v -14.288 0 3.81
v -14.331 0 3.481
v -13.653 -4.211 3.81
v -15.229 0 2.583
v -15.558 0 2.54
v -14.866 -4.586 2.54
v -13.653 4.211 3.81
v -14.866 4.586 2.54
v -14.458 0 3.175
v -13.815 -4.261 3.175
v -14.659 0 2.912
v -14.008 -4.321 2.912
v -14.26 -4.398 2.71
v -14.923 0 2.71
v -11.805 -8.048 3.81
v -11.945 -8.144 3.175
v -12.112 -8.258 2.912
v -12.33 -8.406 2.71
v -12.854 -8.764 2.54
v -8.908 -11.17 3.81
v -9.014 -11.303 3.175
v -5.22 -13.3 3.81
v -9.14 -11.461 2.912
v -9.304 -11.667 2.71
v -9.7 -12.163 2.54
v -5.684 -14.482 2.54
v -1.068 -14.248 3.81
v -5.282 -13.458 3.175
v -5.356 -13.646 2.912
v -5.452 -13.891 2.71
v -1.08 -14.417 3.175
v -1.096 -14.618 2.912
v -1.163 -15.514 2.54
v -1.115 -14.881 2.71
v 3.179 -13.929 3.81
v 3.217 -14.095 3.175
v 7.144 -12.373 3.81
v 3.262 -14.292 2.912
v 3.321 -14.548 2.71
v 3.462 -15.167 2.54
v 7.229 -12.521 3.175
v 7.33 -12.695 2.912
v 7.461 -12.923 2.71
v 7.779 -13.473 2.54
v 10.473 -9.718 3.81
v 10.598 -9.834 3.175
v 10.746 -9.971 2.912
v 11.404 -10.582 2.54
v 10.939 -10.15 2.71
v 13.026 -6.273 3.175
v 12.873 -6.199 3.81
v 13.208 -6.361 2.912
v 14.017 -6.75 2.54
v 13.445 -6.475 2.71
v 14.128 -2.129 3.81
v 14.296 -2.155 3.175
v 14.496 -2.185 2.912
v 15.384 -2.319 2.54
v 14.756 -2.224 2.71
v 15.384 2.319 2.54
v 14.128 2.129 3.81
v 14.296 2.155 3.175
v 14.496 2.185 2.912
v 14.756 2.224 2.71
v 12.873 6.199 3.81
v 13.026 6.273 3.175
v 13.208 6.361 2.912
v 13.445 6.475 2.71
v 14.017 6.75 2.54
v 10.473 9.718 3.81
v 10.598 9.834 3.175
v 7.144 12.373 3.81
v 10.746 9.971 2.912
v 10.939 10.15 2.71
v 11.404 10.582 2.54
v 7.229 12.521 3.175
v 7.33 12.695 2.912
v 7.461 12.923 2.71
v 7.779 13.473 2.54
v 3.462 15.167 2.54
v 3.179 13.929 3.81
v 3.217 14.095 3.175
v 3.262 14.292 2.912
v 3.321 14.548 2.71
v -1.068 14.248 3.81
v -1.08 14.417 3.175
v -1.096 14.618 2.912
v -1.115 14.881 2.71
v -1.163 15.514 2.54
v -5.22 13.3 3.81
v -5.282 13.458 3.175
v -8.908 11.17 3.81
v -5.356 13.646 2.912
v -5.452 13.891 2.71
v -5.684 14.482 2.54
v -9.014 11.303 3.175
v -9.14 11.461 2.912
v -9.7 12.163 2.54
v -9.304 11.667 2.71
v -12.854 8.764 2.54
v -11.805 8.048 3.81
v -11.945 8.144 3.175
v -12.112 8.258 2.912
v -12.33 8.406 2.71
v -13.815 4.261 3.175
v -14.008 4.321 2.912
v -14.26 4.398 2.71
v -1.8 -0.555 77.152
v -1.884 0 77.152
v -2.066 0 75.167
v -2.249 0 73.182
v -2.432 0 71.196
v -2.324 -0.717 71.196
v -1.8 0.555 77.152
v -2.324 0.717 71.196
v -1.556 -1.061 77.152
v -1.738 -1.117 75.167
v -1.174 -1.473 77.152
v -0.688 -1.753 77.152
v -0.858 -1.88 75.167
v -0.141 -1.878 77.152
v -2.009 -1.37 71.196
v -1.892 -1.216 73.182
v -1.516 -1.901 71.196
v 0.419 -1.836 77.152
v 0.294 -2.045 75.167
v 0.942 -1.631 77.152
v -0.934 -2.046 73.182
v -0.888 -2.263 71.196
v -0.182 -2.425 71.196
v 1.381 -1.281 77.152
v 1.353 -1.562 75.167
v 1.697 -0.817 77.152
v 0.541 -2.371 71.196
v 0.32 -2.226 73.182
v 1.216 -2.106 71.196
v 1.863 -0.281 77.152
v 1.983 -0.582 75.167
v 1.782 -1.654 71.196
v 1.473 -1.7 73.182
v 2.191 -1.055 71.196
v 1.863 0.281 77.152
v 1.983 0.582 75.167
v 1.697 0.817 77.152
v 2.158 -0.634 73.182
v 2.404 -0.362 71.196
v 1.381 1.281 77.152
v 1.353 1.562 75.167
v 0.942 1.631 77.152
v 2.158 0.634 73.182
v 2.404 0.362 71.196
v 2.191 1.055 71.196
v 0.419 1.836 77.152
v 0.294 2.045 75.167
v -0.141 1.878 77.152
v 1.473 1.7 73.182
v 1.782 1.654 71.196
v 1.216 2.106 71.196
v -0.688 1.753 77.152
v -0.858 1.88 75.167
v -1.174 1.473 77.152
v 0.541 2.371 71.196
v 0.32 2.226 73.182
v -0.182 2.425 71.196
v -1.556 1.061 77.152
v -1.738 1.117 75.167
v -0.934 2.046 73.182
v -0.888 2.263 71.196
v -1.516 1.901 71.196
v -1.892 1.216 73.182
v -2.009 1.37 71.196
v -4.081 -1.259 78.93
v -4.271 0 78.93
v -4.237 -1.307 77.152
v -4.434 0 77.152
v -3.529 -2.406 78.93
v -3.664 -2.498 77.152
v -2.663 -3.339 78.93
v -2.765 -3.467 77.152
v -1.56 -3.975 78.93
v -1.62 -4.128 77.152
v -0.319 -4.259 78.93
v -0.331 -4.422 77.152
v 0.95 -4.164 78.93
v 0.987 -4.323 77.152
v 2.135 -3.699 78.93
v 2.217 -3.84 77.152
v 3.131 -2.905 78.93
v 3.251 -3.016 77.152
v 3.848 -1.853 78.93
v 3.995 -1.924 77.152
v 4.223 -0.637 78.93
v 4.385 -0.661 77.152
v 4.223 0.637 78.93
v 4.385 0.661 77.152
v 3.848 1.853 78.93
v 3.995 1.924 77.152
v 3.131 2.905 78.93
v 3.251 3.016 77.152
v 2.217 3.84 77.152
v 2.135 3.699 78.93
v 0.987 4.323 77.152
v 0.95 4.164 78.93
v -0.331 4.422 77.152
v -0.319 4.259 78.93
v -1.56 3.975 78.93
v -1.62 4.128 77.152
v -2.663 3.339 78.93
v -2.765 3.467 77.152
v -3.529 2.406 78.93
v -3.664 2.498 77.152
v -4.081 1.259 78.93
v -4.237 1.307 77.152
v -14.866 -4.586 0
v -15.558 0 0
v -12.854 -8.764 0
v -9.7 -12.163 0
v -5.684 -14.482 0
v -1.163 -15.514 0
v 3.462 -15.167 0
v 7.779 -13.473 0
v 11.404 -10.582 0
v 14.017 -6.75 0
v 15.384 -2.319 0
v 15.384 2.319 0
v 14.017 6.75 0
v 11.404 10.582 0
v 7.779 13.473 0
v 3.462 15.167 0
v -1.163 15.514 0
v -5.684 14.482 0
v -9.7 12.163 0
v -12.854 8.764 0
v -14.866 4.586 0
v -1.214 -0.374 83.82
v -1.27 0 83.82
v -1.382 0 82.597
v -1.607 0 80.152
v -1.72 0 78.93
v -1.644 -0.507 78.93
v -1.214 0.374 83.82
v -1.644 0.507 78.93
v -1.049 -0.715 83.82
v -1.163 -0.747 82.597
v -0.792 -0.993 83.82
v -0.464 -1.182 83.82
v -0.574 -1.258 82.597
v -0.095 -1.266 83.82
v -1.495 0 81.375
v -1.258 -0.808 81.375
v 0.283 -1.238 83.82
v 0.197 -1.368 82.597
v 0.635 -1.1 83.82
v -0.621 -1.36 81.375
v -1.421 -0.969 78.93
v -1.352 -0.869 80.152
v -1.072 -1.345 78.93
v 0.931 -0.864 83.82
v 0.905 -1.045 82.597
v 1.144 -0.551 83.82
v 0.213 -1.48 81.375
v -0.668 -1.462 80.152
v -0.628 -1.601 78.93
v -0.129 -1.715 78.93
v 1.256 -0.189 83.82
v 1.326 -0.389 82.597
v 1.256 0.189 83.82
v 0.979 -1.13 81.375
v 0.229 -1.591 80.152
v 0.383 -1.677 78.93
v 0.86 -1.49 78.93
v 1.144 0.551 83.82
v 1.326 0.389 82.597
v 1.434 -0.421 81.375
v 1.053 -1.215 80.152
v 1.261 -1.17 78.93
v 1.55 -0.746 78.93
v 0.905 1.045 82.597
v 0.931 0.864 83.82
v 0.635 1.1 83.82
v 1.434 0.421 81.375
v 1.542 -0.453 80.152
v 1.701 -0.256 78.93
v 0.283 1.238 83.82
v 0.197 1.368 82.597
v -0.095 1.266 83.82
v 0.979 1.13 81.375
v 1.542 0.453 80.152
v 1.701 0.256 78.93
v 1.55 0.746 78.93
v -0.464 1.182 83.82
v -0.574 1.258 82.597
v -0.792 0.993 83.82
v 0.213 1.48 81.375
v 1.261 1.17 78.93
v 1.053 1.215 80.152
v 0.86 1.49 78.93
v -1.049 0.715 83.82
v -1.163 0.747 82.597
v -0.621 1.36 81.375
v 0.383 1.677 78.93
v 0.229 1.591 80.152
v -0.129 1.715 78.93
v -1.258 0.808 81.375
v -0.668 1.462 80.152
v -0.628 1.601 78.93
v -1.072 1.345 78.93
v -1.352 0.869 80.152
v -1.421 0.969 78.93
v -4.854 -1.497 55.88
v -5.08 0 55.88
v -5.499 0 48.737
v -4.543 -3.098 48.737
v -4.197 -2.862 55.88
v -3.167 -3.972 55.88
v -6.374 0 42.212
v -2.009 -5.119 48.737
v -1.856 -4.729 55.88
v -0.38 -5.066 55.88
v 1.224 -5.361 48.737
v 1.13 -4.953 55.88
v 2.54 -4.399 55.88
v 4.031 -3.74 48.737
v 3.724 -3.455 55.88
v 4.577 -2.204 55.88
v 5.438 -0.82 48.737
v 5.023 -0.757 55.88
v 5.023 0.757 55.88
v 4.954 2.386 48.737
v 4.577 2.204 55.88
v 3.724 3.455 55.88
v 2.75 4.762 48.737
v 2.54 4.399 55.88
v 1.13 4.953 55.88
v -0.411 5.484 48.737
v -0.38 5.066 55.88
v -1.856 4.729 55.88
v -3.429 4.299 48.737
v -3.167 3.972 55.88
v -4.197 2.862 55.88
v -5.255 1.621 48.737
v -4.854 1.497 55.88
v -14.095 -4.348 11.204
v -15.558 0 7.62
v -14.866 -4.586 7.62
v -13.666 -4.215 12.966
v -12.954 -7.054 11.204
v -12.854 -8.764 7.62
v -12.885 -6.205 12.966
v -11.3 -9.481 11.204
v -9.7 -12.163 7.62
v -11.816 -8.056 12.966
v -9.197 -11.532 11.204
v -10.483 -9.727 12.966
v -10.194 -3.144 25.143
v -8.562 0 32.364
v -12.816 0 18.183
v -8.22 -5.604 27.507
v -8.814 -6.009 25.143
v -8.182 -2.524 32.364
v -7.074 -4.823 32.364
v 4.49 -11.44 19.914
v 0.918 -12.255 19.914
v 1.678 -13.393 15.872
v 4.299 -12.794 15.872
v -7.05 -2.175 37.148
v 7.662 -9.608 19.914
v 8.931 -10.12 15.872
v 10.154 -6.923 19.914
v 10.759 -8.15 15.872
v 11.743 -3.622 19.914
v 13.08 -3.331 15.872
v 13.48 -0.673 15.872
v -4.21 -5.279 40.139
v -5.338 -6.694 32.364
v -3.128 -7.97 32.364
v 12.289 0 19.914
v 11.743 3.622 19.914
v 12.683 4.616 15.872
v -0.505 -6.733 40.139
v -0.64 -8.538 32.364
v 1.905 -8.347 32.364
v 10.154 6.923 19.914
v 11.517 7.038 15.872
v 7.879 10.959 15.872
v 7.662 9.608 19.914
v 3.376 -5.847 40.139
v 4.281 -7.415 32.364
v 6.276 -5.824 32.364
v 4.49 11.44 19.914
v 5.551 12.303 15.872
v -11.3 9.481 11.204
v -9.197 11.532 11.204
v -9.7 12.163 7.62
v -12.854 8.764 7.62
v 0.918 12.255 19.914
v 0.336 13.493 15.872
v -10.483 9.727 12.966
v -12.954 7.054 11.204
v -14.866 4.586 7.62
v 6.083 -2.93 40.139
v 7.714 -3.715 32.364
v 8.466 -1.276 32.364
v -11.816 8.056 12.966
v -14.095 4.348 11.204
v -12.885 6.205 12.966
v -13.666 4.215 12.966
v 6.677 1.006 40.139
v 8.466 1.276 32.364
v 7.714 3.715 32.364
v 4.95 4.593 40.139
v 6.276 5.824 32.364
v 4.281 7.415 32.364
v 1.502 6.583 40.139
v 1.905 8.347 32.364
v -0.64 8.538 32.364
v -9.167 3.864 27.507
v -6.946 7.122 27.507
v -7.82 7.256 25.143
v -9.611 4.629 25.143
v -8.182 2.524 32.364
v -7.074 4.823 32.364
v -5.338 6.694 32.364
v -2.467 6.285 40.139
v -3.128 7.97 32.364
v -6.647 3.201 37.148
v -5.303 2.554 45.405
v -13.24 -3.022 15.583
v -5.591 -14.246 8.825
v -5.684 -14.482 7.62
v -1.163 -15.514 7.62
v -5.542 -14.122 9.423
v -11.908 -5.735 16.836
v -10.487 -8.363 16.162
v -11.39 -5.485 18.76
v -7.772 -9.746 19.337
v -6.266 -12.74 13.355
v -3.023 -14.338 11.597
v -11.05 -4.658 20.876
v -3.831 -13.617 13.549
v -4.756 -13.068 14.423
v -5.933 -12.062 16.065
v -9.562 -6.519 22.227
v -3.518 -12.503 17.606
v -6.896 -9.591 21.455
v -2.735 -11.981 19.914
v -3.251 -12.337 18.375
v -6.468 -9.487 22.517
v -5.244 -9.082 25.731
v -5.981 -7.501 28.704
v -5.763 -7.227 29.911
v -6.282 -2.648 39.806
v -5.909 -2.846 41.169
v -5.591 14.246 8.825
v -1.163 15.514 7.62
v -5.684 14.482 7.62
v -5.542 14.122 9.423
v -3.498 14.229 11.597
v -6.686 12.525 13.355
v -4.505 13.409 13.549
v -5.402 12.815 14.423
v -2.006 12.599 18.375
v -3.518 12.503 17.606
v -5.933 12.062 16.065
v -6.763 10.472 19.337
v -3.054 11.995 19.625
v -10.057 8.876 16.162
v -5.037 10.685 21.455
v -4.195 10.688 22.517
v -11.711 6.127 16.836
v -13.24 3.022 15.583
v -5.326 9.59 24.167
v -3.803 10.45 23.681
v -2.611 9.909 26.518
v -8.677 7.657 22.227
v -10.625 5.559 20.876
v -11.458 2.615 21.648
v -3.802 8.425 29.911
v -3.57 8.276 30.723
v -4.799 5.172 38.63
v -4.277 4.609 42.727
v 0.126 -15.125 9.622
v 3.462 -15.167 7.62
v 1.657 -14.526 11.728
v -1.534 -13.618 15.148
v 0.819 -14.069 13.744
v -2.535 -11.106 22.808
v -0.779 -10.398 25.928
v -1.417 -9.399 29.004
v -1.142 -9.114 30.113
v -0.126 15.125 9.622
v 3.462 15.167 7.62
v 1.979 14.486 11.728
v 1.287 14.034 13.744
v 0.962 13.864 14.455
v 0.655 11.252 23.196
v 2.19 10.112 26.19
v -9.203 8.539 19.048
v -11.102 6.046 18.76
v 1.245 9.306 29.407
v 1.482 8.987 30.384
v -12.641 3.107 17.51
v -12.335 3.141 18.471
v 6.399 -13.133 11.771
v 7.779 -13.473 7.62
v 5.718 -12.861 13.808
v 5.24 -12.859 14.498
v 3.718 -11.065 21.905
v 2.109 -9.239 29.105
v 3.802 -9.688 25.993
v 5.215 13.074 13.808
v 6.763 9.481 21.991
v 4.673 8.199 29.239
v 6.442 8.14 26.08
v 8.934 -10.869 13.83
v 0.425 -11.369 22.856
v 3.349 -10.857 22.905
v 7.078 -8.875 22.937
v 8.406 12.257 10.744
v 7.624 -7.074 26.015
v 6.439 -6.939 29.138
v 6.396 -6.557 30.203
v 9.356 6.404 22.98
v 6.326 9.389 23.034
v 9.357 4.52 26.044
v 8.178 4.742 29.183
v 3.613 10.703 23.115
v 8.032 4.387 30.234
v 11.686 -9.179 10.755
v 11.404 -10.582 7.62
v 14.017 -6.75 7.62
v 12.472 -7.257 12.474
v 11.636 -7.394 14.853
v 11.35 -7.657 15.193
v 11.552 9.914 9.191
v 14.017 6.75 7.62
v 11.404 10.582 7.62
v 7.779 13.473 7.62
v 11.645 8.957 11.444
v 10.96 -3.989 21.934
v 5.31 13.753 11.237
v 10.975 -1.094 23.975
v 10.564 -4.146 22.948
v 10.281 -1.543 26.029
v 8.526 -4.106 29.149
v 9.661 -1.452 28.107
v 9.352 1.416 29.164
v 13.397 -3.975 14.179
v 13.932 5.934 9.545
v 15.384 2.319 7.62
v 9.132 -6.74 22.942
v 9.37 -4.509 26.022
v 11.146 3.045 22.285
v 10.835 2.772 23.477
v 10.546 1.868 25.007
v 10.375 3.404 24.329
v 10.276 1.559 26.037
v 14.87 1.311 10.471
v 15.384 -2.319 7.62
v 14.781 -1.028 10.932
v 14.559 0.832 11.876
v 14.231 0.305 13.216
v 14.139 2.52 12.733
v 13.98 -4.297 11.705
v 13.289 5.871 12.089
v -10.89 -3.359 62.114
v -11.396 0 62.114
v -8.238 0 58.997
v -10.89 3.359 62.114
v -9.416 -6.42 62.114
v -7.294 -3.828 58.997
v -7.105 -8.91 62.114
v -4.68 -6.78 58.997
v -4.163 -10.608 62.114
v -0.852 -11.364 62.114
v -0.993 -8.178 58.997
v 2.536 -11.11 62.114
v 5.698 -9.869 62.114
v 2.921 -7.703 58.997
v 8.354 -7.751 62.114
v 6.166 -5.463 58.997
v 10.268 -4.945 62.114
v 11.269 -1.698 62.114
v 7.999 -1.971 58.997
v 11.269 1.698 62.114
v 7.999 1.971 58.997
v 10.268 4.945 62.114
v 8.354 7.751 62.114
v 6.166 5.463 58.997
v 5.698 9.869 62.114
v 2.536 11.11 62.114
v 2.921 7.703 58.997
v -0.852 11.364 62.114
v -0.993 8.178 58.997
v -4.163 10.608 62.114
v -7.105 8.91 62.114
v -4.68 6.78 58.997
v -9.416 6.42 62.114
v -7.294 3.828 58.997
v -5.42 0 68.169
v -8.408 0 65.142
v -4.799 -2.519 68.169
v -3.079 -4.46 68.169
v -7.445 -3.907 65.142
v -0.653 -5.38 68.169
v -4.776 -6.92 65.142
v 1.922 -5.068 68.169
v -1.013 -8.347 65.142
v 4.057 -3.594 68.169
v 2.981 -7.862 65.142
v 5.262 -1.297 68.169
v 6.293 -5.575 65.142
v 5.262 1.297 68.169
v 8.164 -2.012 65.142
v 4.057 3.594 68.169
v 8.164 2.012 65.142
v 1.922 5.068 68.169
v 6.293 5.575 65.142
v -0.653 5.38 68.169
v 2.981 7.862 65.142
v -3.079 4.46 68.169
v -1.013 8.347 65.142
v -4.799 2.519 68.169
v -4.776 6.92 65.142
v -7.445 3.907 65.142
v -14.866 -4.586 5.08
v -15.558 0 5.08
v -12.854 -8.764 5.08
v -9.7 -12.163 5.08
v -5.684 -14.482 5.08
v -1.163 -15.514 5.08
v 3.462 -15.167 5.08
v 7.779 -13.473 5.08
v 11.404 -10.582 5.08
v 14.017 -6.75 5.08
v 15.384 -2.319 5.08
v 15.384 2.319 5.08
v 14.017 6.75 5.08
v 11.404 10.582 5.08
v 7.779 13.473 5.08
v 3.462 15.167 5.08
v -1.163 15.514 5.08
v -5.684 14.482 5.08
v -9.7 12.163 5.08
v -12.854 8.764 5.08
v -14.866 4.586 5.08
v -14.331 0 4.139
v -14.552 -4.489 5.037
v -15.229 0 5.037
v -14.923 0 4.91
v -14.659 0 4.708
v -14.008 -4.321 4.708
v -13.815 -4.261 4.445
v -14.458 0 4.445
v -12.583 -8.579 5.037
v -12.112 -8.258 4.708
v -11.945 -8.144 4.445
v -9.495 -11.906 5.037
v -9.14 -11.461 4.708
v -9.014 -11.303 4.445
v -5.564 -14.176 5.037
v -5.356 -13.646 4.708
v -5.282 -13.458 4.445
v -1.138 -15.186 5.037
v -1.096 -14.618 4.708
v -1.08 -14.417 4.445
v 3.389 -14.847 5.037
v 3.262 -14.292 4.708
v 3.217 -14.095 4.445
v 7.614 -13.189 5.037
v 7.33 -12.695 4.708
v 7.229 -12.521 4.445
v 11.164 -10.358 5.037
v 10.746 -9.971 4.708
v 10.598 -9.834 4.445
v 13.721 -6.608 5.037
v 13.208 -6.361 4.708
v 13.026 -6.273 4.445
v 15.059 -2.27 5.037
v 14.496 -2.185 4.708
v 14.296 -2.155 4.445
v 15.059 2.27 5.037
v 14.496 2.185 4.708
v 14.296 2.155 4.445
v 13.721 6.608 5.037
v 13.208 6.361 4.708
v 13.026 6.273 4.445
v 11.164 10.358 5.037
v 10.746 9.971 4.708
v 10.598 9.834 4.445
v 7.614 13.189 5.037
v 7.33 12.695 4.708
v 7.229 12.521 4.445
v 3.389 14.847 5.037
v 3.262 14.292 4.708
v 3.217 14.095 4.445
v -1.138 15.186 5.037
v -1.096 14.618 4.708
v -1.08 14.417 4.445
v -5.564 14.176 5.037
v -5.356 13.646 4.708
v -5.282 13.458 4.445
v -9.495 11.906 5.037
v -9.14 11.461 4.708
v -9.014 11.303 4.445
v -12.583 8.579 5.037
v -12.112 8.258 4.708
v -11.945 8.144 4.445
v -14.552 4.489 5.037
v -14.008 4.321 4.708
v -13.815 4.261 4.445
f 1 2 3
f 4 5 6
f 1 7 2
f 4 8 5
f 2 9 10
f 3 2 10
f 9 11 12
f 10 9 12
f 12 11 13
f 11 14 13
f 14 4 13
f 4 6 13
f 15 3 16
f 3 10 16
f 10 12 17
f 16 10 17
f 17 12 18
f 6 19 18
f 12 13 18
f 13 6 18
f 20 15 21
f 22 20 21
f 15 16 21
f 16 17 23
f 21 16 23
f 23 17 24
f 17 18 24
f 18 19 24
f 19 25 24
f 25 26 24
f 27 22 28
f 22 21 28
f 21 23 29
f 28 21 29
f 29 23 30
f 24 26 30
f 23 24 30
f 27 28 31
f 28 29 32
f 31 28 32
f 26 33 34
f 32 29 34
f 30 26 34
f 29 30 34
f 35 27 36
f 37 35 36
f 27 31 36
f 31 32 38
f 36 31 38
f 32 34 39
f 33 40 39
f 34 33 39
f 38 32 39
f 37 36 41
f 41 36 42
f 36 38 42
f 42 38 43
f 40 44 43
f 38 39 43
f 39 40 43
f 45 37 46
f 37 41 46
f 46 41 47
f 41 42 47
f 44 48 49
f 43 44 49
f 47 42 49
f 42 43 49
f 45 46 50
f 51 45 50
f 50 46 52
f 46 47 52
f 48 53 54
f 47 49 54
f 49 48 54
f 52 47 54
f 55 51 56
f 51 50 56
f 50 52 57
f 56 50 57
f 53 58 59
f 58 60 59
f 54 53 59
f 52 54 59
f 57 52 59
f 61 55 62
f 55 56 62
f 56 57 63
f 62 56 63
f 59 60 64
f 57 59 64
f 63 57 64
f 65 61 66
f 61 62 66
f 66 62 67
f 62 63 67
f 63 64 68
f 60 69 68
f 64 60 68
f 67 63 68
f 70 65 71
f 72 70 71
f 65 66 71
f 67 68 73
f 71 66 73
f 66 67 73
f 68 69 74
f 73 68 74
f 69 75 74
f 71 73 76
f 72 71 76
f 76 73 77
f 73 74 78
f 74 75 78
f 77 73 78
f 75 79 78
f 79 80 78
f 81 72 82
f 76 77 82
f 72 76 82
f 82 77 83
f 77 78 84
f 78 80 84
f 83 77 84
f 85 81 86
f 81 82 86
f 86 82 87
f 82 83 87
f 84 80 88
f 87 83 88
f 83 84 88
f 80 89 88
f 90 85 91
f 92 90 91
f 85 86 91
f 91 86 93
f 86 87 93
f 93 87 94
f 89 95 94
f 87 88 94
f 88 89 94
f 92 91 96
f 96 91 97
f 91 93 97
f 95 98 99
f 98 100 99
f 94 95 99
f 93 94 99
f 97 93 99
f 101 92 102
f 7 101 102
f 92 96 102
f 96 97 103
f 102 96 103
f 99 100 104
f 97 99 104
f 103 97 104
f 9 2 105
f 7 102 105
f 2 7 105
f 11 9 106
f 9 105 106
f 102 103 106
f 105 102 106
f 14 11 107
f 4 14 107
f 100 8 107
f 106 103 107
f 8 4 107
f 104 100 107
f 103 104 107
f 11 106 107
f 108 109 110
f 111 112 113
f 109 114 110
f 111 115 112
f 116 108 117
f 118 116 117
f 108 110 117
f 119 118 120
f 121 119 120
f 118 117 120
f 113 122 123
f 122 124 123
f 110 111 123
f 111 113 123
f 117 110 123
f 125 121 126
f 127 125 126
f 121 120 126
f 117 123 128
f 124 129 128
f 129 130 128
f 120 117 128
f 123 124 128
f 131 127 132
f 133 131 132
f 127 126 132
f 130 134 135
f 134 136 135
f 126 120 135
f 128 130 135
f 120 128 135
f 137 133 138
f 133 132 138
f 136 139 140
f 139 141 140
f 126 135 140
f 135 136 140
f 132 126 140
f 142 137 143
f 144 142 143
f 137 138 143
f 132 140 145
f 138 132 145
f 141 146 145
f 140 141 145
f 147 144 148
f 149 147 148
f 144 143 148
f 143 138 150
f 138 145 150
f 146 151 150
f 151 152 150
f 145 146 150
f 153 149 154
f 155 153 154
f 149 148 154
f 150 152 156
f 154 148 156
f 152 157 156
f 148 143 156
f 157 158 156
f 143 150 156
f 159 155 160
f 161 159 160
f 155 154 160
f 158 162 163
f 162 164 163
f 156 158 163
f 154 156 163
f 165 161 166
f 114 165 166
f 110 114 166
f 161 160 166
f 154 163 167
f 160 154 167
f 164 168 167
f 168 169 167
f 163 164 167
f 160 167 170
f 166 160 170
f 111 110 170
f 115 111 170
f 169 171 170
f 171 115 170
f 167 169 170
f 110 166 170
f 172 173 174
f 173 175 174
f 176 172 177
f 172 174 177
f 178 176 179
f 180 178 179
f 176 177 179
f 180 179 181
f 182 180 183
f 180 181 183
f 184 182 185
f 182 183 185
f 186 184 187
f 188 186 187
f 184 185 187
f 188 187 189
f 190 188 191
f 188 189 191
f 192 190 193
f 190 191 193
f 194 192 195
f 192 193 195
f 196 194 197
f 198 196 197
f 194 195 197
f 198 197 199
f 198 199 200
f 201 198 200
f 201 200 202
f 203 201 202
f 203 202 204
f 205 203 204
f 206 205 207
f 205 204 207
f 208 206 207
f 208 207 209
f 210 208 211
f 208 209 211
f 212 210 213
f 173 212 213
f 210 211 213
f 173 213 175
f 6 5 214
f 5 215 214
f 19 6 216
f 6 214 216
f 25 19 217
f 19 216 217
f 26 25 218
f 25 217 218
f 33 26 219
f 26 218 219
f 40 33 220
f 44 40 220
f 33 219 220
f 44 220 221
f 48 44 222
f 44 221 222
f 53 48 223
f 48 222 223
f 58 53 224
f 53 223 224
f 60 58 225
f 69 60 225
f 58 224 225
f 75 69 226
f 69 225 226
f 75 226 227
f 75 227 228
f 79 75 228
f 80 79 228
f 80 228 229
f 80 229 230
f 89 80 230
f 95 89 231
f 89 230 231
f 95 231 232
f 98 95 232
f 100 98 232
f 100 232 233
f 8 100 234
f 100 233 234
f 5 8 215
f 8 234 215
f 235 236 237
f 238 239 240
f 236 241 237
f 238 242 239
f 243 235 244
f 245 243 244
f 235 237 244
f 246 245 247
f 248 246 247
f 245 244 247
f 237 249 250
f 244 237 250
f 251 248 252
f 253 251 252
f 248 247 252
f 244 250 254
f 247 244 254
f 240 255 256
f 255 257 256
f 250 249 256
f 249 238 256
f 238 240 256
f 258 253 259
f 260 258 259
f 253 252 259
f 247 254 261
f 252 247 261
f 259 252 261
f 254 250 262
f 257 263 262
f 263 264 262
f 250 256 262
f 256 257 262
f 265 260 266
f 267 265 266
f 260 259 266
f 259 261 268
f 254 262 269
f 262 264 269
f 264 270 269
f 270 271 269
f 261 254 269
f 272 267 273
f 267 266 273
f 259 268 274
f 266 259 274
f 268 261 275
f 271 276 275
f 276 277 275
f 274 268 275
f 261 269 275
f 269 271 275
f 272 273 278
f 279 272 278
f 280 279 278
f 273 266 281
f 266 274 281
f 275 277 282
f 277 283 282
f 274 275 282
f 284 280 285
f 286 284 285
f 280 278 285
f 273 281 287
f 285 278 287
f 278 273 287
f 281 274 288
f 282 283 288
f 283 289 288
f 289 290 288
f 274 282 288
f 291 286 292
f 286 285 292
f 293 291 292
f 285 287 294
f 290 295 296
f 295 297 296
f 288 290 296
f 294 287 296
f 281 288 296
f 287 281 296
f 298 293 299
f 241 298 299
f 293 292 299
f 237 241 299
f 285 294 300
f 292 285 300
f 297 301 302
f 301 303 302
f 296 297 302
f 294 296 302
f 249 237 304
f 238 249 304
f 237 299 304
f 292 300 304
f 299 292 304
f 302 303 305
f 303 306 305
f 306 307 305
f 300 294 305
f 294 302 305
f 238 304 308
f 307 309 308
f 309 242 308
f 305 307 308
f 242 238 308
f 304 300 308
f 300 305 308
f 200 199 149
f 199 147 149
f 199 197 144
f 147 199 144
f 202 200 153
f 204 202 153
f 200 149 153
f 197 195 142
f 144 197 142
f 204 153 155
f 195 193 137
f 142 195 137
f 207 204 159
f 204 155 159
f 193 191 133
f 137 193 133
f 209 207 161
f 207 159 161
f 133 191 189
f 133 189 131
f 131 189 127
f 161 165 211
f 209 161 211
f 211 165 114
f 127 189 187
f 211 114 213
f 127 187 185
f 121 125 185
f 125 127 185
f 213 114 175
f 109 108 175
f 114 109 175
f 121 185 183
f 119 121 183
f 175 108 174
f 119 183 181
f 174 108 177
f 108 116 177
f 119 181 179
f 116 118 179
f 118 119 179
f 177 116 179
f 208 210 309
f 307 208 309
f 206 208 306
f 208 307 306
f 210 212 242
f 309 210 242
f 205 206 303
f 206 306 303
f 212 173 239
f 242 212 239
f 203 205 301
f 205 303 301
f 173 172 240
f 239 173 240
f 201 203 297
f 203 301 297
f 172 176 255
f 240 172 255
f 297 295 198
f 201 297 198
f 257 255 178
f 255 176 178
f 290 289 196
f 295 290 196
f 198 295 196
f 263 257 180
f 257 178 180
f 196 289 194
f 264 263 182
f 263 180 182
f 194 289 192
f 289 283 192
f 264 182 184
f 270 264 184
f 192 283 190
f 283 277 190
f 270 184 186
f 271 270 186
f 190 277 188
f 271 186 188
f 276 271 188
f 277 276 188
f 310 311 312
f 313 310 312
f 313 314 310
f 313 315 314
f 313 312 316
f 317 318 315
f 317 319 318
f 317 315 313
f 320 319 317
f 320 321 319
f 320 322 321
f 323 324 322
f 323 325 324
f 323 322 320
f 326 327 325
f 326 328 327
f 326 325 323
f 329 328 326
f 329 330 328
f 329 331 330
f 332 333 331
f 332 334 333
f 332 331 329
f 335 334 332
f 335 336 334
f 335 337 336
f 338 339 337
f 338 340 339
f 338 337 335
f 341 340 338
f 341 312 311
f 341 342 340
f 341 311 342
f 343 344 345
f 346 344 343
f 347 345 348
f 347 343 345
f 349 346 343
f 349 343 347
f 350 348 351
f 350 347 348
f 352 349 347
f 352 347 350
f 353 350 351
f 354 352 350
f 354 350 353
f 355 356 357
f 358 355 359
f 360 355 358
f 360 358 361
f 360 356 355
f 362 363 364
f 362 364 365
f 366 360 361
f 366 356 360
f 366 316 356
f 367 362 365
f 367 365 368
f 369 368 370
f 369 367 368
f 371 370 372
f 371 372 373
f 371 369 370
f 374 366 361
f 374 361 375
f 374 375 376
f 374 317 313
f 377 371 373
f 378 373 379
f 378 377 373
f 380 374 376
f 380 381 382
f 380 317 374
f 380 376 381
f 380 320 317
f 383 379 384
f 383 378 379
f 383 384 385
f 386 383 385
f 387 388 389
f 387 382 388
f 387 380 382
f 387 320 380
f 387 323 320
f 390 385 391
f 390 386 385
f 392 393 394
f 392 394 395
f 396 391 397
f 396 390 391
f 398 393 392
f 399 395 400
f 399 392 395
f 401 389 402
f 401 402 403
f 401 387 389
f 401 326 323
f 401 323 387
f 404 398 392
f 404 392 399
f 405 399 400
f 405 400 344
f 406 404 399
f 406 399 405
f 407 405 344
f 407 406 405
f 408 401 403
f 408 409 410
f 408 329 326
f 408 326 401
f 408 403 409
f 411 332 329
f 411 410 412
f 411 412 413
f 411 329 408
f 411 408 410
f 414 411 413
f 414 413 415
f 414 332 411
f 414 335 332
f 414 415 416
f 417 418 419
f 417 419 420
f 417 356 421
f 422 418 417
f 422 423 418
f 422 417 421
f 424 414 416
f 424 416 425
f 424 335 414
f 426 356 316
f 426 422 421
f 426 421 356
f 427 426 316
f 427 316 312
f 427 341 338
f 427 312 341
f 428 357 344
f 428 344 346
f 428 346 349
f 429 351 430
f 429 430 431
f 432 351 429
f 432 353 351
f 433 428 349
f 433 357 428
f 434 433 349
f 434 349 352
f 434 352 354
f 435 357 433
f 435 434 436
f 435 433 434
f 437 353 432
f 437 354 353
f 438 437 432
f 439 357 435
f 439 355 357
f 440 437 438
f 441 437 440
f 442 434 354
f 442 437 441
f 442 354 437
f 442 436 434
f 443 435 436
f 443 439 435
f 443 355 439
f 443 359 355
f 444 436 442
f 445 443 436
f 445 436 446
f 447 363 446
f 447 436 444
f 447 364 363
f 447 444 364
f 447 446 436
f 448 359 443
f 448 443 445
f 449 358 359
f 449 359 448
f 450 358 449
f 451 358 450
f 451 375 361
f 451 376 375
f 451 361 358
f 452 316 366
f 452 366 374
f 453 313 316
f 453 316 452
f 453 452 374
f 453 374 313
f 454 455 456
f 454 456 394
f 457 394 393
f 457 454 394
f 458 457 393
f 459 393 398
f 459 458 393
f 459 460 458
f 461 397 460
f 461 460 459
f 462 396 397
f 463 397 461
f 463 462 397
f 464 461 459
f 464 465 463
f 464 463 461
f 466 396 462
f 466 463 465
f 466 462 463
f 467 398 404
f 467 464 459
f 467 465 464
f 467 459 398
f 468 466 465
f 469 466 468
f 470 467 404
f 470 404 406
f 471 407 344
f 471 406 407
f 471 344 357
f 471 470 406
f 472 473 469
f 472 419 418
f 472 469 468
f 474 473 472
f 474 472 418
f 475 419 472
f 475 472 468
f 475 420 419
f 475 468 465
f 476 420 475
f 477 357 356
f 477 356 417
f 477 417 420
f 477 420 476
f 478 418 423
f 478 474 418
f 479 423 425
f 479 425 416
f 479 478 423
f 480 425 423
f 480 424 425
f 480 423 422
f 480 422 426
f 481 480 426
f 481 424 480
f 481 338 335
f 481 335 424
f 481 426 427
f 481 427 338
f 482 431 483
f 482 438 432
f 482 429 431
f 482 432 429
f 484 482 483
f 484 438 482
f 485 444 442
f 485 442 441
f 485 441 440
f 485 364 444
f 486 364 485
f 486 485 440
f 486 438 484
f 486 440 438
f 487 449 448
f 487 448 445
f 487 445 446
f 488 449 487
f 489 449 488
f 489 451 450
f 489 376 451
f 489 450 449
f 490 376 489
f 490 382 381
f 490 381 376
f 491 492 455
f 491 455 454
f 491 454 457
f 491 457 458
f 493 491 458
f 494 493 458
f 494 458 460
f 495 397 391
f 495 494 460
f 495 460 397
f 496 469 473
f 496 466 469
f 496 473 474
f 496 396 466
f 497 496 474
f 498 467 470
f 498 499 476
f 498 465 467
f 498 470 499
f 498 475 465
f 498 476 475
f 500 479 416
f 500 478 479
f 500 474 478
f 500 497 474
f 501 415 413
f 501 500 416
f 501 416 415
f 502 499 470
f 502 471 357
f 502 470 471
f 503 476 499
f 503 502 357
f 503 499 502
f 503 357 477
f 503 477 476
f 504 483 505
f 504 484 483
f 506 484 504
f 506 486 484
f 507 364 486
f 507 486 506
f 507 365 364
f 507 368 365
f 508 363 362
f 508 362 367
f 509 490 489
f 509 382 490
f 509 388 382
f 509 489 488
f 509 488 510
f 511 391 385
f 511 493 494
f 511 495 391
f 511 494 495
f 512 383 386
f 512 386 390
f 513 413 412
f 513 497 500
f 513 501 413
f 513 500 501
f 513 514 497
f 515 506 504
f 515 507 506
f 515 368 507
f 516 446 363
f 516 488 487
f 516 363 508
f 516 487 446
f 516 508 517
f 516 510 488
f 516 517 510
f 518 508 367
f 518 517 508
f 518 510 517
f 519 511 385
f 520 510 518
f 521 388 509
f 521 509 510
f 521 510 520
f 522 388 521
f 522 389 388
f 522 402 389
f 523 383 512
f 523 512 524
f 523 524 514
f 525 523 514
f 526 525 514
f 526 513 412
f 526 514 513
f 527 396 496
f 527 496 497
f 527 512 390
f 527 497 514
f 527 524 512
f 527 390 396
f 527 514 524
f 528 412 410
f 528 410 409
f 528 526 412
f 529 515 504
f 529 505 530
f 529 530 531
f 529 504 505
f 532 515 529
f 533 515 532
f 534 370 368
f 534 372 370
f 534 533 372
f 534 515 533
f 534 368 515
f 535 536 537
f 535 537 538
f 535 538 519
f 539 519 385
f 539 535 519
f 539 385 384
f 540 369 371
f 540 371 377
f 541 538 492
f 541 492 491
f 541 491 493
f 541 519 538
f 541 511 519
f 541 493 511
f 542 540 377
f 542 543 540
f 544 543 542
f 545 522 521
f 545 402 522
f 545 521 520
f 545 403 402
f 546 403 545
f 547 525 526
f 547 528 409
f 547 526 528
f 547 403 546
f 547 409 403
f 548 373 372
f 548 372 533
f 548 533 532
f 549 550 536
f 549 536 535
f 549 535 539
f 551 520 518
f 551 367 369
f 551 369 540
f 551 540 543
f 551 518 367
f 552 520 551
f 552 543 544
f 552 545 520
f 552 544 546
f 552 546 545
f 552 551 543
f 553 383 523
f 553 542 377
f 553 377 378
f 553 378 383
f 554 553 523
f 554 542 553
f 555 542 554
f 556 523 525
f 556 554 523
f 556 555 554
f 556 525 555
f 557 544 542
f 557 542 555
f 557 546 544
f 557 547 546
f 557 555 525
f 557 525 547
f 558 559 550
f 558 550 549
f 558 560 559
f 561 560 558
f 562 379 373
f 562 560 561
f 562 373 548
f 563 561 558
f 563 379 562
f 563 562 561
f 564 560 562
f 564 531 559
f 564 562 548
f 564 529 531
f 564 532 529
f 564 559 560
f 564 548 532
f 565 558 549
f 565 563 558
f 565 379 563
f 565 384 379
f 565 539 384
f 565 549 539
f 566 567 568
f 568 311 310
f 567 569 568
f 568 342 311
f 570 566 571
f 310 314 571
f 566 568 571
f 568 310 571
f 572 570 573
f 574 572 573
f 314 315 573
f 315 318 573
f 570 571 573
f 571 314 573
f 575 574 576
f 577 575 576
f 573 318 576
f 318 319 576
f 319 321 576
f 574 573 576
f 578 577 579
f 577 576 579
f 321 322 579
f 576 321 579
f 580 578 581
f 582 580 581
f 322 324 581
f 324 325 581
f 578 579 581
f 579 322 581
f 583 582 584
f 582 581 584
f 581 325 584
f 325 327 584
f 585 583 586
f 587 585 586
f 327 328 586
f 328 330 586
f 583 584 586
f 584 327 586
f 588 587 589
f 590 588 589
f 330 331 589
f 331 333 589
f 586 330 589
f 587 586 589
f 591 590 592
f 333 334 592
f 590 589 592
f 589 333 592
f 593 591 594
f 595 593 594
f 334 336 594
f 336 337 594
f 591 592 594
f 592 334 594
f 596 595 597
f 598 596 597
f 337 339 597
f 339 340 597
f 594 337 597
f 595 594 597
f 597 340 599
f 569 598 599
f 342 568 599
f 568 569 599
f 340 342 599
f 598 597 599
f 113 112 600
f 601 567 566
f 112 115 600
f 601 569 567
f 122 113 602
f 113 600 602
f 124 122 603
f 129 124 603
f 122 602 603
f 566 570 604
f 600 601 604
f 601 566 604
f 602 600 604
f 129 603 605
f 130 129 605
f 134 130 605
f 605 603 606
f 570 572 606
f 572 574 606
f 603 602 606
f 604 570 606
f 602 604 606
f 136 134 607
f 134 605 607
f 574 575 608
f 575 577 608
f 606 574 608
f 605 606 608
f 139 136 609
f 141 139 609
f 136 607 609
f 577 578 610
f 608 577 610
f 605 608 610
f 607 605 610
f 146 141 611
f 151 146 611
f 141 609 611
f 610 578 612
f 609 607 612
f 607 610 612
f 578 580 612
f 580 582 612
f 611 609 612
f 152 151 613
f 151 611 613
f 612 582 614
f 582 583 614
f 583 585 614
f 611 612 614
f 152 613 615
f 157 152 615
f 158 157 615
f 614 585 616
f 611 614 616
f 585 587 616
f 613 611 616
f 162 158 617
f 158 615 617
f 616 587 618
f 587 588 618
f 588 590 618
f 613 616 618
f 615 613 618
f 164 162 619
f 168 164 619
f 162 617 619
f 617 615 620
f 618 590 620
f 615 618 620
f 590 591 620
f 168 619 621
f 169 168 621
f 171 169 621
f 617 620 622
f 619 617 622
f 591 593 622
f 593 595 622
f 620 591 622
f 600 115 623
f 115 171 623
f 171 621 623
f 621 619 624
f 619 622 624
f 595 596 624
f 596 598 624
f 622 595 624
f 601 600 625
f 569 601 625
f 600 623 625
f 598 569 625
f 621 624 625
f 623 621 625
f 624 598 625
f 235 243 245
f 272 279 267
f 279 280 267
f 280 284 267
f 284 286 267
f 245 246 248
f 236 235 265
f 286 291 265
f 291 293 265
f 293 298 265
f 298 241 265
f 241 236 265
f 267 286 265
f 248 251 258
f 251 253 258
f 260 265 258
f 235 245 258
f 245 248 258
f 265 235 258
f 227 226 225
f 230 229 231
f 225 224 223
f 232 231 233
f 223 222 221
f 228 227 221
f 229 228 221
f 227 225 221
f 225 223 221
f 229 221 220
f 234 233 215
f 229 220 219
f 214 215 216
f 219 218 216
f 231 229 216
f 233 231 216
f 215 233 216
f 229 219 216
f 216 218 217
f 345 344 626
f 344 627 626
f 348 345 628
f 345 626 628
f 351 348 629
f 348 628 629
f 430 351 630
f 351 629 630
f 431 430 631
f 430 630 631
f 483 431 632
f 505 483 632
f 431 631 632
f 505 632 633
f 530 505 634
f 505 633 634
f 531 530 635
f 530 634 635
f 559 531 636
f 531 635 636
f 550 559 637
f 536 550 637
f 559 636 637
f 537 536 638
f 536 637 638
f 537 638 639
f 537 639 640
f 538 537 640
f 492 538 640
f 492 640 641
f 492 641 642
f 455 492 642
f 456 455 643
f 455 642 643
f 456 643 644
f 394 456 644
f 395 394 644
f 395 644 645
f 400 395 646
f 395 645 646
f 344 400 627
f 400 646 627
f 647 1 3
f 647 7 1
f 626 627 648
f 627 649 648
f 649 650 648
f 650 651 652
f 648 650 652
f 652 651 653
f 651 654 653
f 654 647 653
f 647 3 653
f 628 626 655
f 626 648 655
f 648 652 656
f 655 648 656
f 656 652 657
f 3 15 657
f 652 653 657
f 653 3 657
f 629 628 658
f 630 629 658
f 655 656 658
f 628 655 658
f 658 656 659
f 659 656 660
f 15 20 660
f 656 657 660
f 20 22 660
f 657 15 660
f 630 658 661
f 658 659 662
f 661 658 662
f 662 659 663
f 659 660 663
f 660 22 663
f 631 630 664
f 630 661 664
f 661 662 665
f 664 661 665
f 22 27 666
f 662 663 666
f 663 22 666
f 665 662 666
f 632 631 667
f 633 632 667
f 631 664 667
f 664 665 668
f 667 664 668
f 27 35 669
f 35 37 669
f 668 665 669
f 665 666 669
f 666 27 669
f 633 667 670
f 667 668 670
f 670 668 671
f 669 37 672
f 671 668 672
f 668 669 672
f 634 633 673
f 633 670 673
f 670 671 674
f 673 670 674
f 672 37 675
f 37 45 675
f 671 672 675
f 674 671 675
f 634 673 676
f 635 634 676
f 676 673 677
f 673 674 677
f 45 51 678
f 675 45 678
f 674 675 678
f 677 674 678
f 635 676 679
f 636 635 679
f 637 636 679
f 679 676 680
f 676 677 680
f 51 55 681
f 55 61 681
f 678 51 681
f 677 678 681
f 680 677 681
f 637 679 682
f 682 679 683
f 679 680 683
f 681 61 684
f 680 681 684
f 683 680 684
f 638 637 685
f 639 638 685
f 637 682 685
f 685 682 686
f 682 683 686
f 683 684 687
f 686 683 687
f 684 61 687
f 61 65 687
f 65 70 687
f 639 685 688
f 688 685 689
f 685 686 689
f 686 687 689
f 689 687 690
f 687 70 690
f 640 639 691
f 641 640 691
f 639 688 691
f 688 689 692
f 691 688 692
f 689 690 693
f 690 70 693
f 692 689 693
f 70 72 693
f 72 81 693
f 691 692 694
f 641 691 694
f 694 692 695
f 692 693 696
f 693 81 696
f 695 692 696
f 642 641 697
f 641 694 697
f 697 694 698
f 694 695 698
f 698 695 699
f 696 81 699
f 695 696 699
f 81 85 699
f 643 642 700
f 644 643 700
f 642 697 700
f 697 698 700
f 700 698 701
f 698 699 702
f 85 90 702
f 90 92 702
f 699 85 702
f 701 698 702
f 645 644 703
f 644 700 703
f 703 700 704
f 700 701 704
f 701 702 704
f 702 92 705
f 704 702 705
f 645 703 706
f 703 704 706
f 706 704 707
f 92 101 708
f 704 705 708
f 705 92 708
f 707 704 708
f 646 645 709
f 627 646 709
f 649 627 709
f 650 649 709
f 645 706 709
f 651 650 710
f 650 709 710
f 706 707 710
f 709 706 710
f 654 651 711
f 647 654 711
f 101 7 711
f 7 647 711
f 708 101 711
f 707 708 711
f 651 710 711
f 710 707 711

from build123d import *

# Parameters (mm, degrees)
F0_W   = 1.27
F0_H   = 1.27
F0_W_2 = 3.81
F0_H_2 = 3.5783256781


with BuildPart() as f1:
    # F0 (on Front) → F1 (revolve)
    with BuildSketch(Plane.XZ):
        with BuildLine():
            Line((-12.7, 0), (0, 0))
            add(Edge.make_bspline(
                [(0, 0), (7.4514020234, 3.331559943), (-2.5339151704, 7.6260847131), (-2.54, 12.7)],
                knots=[0, 0, 0, 0, 12.9515095645, 12.9515095645, 12.9515095645, 12.9515095645], degree=3))
            Line((-2.54, 12.7), (-12.7, 12.7))
            Line((-12.7, 12.7), (-12.7, 0))
        make_face()
        with BuildLine():
            Line((-12.7, 12.7), (-2.54, 12.7))
            add(Edge.make_bspline(
                [(-2.54, 12.7), (4.5093661174, 26.4475625008), (-14.613872394, 38.6360026896), (-5.08, 50.8)],
                knots=[0, 0, 0, 0, 38.1845728011, 38.1845728011, 38.1845728011, 38.1845728011], degree=3))
            Line((-5.08, 50.8), (-12.7, 50.8))
            Line((-12.7, 50.8), (-12.7, 12.7))
        make_face()
        with BuildLine():
            Line((-12.7, 50.8), (-5.08, 50.8))
            add(Edge.make_bspline(
                [(-5.08, 50.8), (-3.208857961, 50.9595312178), (-3.3491132781, 53.203612566), (-5.08, 53.34)],
                knots=[0, 0, 0, 0, 2.54, 2.54, 2.54, 2.54], degree=3))
            Line((-5.08, 53.34), (-9.7673060372, 53.34))
            Line((-9.7673060372, 53.34), (-11.43, 53.34))
            Line((-11.43, 53.34), (-12.7, 53.34))
            Line((-12.7, 53.34), (-12.7, 50.8))
        make_face()
        with BuildLine():
            Line((-9.7673060372, 53.34), (-5.08, 53.34))
            Line((-5.08, 53.34), (-2.0844770548, 59.69))
            add(Edge.make_bspline(
                [(-11.43, 53.5471198024), (-8.0565585685, 54.6403665691), (-5.5479568491, 59.69), (-2.0844770548, 59.69)],
                knots=[1.3390316874, 1.3390316874, 1.3390316874, 1.3390316874, 12.3697949619, 12.3697949619, 12.3697949619, 12.3697949619], degree=3))
            Line((-11.43, 53.5471198024), (-11.43, 53.34))
            Line((-11.43, 53.34), (-9.7673060372, 53.34))
        make_face()
        with BuildLine():
            add(Edge.make_bspline(
                [(-12.7, 53.34), (-12.2617526092, 53.34), (-11.8395042981, 53.4144098506), (-11.43, 53.5471198024)],
                knots=[0, 0, 0, 0, 1.3390316874, 1.3390316874, 1.3390316874, 1.3390316874], degree=3))
            Line((-12.7, 53.34), (-11.43, 53.34))
            Line((-11.43, 53.34), (-11.43, 53.5471198024))
        make_face()
        with BuildLine():
            Line((-12.7, 61.1916743219), (-12.7, 53.34))
            add(Edge.make_bspline(
                [(-12.7, 53.34), (-12.2617526092, 53.34), (-11.8395042981, 53.4144098506), (-11.43, 53.5471198024)],
                knots=[0, 0, 0, 0, 1.3390316874, 1.3390316874, 1.3390316874, 1.3390316874], degree=3))
            Line((-11.43, 53.5471198024), (-11.43, 61.1916743219))
            Line((-11.43, 61.1916743219), (-12.7, 61.1916743219))
        make_face()
        with Locations((-12.065, 61.8266743219)):
            Rectangle(F0_W, F0_H)
        with Locations((-9.525, 61.8266743219)):
            Rectangle(F0_W_2, F0_H)
        with Locations((-12.065, 64.2508371609)):
            Rectangle(F0_W, F0_H_2)
    revolve(axis=Axis((-12.7, 0, 25.4), (0, 0, 1)))


with BuildPart() as f4:
    # F3 (on Front) → F4 (revolve)
    with BuildSketch(Plane.XZ):
        Polygon((-1.27, 83.82), (-1.7199835438, 78.9296406197), (0, 78.9296406197), (0, 83.82), align=None)
        Polygon((-4.4343151529, 77.1516406197), (-1.8835851687, 77.1516406197), (-1.7199835438, 78.9296406197), (-4.270713528, 78.9296406197), align=None)
        with BuildLine():
            Line((-15.5575, 0), (0, 0))
            Line((0, 0), (0, 55.88))
            Line((0, 55.88), (-5.08, 55.88))
            add(Edge.make_bspline(
                [(-15.5575, 7.62), (-12.4826701358, 22.7640494704), (-5.5103190243, 35.0550673902), (-5.08, 55.88)],
                knots=[0, 0, 0, 0, 49.3842647637, 49.3842647637, 49.3842647637, 49.3842647637], degree=3))
            Line((-15.5575, 7.62), (-15.5575, 5.08))
            ThreePointArc((-15.5575, 5.08), (-14.6594743879, 4.7080256121), (-14.2875, 3.81))
            ThreePointArc((-14.2875, 3.81), (-14.6594743879, 2.9119743879), (-15.5575, 2.54))
            Line((-15.5575, 2.54), (-15.5575, 0))
        make_face()
        Polygon((-5.08, 55.88), (0, 55.88), (0, 70.0178143454), (-2.54, 70.0178143454), (-2.4315444093, 71.1964948159), (-11.3960751224, 62.1141322649), align=None)
        Polygon((-2.54, 70.0178143454), (0, 70.0178143454), (0, 73.66), (-2.4315444093, 71.1964948159), align=None)
        Polygon((-2.4315444093, 71.1964948159), (0, 73.66), (0, 77.1516406197), (-1.8835851687, 77.1516406197), align=None)
        Polygon((-1.8835851687, 77.1516406197), (0, 77.1516406197), (0, 78.2914757729), (0, 78.9296406197), (-1.7199835438, 78.9296406197), align=None)
    revolve(axis=Axis((0, 0, 27.94), (0, 0, 1)))


solid = f4.part
